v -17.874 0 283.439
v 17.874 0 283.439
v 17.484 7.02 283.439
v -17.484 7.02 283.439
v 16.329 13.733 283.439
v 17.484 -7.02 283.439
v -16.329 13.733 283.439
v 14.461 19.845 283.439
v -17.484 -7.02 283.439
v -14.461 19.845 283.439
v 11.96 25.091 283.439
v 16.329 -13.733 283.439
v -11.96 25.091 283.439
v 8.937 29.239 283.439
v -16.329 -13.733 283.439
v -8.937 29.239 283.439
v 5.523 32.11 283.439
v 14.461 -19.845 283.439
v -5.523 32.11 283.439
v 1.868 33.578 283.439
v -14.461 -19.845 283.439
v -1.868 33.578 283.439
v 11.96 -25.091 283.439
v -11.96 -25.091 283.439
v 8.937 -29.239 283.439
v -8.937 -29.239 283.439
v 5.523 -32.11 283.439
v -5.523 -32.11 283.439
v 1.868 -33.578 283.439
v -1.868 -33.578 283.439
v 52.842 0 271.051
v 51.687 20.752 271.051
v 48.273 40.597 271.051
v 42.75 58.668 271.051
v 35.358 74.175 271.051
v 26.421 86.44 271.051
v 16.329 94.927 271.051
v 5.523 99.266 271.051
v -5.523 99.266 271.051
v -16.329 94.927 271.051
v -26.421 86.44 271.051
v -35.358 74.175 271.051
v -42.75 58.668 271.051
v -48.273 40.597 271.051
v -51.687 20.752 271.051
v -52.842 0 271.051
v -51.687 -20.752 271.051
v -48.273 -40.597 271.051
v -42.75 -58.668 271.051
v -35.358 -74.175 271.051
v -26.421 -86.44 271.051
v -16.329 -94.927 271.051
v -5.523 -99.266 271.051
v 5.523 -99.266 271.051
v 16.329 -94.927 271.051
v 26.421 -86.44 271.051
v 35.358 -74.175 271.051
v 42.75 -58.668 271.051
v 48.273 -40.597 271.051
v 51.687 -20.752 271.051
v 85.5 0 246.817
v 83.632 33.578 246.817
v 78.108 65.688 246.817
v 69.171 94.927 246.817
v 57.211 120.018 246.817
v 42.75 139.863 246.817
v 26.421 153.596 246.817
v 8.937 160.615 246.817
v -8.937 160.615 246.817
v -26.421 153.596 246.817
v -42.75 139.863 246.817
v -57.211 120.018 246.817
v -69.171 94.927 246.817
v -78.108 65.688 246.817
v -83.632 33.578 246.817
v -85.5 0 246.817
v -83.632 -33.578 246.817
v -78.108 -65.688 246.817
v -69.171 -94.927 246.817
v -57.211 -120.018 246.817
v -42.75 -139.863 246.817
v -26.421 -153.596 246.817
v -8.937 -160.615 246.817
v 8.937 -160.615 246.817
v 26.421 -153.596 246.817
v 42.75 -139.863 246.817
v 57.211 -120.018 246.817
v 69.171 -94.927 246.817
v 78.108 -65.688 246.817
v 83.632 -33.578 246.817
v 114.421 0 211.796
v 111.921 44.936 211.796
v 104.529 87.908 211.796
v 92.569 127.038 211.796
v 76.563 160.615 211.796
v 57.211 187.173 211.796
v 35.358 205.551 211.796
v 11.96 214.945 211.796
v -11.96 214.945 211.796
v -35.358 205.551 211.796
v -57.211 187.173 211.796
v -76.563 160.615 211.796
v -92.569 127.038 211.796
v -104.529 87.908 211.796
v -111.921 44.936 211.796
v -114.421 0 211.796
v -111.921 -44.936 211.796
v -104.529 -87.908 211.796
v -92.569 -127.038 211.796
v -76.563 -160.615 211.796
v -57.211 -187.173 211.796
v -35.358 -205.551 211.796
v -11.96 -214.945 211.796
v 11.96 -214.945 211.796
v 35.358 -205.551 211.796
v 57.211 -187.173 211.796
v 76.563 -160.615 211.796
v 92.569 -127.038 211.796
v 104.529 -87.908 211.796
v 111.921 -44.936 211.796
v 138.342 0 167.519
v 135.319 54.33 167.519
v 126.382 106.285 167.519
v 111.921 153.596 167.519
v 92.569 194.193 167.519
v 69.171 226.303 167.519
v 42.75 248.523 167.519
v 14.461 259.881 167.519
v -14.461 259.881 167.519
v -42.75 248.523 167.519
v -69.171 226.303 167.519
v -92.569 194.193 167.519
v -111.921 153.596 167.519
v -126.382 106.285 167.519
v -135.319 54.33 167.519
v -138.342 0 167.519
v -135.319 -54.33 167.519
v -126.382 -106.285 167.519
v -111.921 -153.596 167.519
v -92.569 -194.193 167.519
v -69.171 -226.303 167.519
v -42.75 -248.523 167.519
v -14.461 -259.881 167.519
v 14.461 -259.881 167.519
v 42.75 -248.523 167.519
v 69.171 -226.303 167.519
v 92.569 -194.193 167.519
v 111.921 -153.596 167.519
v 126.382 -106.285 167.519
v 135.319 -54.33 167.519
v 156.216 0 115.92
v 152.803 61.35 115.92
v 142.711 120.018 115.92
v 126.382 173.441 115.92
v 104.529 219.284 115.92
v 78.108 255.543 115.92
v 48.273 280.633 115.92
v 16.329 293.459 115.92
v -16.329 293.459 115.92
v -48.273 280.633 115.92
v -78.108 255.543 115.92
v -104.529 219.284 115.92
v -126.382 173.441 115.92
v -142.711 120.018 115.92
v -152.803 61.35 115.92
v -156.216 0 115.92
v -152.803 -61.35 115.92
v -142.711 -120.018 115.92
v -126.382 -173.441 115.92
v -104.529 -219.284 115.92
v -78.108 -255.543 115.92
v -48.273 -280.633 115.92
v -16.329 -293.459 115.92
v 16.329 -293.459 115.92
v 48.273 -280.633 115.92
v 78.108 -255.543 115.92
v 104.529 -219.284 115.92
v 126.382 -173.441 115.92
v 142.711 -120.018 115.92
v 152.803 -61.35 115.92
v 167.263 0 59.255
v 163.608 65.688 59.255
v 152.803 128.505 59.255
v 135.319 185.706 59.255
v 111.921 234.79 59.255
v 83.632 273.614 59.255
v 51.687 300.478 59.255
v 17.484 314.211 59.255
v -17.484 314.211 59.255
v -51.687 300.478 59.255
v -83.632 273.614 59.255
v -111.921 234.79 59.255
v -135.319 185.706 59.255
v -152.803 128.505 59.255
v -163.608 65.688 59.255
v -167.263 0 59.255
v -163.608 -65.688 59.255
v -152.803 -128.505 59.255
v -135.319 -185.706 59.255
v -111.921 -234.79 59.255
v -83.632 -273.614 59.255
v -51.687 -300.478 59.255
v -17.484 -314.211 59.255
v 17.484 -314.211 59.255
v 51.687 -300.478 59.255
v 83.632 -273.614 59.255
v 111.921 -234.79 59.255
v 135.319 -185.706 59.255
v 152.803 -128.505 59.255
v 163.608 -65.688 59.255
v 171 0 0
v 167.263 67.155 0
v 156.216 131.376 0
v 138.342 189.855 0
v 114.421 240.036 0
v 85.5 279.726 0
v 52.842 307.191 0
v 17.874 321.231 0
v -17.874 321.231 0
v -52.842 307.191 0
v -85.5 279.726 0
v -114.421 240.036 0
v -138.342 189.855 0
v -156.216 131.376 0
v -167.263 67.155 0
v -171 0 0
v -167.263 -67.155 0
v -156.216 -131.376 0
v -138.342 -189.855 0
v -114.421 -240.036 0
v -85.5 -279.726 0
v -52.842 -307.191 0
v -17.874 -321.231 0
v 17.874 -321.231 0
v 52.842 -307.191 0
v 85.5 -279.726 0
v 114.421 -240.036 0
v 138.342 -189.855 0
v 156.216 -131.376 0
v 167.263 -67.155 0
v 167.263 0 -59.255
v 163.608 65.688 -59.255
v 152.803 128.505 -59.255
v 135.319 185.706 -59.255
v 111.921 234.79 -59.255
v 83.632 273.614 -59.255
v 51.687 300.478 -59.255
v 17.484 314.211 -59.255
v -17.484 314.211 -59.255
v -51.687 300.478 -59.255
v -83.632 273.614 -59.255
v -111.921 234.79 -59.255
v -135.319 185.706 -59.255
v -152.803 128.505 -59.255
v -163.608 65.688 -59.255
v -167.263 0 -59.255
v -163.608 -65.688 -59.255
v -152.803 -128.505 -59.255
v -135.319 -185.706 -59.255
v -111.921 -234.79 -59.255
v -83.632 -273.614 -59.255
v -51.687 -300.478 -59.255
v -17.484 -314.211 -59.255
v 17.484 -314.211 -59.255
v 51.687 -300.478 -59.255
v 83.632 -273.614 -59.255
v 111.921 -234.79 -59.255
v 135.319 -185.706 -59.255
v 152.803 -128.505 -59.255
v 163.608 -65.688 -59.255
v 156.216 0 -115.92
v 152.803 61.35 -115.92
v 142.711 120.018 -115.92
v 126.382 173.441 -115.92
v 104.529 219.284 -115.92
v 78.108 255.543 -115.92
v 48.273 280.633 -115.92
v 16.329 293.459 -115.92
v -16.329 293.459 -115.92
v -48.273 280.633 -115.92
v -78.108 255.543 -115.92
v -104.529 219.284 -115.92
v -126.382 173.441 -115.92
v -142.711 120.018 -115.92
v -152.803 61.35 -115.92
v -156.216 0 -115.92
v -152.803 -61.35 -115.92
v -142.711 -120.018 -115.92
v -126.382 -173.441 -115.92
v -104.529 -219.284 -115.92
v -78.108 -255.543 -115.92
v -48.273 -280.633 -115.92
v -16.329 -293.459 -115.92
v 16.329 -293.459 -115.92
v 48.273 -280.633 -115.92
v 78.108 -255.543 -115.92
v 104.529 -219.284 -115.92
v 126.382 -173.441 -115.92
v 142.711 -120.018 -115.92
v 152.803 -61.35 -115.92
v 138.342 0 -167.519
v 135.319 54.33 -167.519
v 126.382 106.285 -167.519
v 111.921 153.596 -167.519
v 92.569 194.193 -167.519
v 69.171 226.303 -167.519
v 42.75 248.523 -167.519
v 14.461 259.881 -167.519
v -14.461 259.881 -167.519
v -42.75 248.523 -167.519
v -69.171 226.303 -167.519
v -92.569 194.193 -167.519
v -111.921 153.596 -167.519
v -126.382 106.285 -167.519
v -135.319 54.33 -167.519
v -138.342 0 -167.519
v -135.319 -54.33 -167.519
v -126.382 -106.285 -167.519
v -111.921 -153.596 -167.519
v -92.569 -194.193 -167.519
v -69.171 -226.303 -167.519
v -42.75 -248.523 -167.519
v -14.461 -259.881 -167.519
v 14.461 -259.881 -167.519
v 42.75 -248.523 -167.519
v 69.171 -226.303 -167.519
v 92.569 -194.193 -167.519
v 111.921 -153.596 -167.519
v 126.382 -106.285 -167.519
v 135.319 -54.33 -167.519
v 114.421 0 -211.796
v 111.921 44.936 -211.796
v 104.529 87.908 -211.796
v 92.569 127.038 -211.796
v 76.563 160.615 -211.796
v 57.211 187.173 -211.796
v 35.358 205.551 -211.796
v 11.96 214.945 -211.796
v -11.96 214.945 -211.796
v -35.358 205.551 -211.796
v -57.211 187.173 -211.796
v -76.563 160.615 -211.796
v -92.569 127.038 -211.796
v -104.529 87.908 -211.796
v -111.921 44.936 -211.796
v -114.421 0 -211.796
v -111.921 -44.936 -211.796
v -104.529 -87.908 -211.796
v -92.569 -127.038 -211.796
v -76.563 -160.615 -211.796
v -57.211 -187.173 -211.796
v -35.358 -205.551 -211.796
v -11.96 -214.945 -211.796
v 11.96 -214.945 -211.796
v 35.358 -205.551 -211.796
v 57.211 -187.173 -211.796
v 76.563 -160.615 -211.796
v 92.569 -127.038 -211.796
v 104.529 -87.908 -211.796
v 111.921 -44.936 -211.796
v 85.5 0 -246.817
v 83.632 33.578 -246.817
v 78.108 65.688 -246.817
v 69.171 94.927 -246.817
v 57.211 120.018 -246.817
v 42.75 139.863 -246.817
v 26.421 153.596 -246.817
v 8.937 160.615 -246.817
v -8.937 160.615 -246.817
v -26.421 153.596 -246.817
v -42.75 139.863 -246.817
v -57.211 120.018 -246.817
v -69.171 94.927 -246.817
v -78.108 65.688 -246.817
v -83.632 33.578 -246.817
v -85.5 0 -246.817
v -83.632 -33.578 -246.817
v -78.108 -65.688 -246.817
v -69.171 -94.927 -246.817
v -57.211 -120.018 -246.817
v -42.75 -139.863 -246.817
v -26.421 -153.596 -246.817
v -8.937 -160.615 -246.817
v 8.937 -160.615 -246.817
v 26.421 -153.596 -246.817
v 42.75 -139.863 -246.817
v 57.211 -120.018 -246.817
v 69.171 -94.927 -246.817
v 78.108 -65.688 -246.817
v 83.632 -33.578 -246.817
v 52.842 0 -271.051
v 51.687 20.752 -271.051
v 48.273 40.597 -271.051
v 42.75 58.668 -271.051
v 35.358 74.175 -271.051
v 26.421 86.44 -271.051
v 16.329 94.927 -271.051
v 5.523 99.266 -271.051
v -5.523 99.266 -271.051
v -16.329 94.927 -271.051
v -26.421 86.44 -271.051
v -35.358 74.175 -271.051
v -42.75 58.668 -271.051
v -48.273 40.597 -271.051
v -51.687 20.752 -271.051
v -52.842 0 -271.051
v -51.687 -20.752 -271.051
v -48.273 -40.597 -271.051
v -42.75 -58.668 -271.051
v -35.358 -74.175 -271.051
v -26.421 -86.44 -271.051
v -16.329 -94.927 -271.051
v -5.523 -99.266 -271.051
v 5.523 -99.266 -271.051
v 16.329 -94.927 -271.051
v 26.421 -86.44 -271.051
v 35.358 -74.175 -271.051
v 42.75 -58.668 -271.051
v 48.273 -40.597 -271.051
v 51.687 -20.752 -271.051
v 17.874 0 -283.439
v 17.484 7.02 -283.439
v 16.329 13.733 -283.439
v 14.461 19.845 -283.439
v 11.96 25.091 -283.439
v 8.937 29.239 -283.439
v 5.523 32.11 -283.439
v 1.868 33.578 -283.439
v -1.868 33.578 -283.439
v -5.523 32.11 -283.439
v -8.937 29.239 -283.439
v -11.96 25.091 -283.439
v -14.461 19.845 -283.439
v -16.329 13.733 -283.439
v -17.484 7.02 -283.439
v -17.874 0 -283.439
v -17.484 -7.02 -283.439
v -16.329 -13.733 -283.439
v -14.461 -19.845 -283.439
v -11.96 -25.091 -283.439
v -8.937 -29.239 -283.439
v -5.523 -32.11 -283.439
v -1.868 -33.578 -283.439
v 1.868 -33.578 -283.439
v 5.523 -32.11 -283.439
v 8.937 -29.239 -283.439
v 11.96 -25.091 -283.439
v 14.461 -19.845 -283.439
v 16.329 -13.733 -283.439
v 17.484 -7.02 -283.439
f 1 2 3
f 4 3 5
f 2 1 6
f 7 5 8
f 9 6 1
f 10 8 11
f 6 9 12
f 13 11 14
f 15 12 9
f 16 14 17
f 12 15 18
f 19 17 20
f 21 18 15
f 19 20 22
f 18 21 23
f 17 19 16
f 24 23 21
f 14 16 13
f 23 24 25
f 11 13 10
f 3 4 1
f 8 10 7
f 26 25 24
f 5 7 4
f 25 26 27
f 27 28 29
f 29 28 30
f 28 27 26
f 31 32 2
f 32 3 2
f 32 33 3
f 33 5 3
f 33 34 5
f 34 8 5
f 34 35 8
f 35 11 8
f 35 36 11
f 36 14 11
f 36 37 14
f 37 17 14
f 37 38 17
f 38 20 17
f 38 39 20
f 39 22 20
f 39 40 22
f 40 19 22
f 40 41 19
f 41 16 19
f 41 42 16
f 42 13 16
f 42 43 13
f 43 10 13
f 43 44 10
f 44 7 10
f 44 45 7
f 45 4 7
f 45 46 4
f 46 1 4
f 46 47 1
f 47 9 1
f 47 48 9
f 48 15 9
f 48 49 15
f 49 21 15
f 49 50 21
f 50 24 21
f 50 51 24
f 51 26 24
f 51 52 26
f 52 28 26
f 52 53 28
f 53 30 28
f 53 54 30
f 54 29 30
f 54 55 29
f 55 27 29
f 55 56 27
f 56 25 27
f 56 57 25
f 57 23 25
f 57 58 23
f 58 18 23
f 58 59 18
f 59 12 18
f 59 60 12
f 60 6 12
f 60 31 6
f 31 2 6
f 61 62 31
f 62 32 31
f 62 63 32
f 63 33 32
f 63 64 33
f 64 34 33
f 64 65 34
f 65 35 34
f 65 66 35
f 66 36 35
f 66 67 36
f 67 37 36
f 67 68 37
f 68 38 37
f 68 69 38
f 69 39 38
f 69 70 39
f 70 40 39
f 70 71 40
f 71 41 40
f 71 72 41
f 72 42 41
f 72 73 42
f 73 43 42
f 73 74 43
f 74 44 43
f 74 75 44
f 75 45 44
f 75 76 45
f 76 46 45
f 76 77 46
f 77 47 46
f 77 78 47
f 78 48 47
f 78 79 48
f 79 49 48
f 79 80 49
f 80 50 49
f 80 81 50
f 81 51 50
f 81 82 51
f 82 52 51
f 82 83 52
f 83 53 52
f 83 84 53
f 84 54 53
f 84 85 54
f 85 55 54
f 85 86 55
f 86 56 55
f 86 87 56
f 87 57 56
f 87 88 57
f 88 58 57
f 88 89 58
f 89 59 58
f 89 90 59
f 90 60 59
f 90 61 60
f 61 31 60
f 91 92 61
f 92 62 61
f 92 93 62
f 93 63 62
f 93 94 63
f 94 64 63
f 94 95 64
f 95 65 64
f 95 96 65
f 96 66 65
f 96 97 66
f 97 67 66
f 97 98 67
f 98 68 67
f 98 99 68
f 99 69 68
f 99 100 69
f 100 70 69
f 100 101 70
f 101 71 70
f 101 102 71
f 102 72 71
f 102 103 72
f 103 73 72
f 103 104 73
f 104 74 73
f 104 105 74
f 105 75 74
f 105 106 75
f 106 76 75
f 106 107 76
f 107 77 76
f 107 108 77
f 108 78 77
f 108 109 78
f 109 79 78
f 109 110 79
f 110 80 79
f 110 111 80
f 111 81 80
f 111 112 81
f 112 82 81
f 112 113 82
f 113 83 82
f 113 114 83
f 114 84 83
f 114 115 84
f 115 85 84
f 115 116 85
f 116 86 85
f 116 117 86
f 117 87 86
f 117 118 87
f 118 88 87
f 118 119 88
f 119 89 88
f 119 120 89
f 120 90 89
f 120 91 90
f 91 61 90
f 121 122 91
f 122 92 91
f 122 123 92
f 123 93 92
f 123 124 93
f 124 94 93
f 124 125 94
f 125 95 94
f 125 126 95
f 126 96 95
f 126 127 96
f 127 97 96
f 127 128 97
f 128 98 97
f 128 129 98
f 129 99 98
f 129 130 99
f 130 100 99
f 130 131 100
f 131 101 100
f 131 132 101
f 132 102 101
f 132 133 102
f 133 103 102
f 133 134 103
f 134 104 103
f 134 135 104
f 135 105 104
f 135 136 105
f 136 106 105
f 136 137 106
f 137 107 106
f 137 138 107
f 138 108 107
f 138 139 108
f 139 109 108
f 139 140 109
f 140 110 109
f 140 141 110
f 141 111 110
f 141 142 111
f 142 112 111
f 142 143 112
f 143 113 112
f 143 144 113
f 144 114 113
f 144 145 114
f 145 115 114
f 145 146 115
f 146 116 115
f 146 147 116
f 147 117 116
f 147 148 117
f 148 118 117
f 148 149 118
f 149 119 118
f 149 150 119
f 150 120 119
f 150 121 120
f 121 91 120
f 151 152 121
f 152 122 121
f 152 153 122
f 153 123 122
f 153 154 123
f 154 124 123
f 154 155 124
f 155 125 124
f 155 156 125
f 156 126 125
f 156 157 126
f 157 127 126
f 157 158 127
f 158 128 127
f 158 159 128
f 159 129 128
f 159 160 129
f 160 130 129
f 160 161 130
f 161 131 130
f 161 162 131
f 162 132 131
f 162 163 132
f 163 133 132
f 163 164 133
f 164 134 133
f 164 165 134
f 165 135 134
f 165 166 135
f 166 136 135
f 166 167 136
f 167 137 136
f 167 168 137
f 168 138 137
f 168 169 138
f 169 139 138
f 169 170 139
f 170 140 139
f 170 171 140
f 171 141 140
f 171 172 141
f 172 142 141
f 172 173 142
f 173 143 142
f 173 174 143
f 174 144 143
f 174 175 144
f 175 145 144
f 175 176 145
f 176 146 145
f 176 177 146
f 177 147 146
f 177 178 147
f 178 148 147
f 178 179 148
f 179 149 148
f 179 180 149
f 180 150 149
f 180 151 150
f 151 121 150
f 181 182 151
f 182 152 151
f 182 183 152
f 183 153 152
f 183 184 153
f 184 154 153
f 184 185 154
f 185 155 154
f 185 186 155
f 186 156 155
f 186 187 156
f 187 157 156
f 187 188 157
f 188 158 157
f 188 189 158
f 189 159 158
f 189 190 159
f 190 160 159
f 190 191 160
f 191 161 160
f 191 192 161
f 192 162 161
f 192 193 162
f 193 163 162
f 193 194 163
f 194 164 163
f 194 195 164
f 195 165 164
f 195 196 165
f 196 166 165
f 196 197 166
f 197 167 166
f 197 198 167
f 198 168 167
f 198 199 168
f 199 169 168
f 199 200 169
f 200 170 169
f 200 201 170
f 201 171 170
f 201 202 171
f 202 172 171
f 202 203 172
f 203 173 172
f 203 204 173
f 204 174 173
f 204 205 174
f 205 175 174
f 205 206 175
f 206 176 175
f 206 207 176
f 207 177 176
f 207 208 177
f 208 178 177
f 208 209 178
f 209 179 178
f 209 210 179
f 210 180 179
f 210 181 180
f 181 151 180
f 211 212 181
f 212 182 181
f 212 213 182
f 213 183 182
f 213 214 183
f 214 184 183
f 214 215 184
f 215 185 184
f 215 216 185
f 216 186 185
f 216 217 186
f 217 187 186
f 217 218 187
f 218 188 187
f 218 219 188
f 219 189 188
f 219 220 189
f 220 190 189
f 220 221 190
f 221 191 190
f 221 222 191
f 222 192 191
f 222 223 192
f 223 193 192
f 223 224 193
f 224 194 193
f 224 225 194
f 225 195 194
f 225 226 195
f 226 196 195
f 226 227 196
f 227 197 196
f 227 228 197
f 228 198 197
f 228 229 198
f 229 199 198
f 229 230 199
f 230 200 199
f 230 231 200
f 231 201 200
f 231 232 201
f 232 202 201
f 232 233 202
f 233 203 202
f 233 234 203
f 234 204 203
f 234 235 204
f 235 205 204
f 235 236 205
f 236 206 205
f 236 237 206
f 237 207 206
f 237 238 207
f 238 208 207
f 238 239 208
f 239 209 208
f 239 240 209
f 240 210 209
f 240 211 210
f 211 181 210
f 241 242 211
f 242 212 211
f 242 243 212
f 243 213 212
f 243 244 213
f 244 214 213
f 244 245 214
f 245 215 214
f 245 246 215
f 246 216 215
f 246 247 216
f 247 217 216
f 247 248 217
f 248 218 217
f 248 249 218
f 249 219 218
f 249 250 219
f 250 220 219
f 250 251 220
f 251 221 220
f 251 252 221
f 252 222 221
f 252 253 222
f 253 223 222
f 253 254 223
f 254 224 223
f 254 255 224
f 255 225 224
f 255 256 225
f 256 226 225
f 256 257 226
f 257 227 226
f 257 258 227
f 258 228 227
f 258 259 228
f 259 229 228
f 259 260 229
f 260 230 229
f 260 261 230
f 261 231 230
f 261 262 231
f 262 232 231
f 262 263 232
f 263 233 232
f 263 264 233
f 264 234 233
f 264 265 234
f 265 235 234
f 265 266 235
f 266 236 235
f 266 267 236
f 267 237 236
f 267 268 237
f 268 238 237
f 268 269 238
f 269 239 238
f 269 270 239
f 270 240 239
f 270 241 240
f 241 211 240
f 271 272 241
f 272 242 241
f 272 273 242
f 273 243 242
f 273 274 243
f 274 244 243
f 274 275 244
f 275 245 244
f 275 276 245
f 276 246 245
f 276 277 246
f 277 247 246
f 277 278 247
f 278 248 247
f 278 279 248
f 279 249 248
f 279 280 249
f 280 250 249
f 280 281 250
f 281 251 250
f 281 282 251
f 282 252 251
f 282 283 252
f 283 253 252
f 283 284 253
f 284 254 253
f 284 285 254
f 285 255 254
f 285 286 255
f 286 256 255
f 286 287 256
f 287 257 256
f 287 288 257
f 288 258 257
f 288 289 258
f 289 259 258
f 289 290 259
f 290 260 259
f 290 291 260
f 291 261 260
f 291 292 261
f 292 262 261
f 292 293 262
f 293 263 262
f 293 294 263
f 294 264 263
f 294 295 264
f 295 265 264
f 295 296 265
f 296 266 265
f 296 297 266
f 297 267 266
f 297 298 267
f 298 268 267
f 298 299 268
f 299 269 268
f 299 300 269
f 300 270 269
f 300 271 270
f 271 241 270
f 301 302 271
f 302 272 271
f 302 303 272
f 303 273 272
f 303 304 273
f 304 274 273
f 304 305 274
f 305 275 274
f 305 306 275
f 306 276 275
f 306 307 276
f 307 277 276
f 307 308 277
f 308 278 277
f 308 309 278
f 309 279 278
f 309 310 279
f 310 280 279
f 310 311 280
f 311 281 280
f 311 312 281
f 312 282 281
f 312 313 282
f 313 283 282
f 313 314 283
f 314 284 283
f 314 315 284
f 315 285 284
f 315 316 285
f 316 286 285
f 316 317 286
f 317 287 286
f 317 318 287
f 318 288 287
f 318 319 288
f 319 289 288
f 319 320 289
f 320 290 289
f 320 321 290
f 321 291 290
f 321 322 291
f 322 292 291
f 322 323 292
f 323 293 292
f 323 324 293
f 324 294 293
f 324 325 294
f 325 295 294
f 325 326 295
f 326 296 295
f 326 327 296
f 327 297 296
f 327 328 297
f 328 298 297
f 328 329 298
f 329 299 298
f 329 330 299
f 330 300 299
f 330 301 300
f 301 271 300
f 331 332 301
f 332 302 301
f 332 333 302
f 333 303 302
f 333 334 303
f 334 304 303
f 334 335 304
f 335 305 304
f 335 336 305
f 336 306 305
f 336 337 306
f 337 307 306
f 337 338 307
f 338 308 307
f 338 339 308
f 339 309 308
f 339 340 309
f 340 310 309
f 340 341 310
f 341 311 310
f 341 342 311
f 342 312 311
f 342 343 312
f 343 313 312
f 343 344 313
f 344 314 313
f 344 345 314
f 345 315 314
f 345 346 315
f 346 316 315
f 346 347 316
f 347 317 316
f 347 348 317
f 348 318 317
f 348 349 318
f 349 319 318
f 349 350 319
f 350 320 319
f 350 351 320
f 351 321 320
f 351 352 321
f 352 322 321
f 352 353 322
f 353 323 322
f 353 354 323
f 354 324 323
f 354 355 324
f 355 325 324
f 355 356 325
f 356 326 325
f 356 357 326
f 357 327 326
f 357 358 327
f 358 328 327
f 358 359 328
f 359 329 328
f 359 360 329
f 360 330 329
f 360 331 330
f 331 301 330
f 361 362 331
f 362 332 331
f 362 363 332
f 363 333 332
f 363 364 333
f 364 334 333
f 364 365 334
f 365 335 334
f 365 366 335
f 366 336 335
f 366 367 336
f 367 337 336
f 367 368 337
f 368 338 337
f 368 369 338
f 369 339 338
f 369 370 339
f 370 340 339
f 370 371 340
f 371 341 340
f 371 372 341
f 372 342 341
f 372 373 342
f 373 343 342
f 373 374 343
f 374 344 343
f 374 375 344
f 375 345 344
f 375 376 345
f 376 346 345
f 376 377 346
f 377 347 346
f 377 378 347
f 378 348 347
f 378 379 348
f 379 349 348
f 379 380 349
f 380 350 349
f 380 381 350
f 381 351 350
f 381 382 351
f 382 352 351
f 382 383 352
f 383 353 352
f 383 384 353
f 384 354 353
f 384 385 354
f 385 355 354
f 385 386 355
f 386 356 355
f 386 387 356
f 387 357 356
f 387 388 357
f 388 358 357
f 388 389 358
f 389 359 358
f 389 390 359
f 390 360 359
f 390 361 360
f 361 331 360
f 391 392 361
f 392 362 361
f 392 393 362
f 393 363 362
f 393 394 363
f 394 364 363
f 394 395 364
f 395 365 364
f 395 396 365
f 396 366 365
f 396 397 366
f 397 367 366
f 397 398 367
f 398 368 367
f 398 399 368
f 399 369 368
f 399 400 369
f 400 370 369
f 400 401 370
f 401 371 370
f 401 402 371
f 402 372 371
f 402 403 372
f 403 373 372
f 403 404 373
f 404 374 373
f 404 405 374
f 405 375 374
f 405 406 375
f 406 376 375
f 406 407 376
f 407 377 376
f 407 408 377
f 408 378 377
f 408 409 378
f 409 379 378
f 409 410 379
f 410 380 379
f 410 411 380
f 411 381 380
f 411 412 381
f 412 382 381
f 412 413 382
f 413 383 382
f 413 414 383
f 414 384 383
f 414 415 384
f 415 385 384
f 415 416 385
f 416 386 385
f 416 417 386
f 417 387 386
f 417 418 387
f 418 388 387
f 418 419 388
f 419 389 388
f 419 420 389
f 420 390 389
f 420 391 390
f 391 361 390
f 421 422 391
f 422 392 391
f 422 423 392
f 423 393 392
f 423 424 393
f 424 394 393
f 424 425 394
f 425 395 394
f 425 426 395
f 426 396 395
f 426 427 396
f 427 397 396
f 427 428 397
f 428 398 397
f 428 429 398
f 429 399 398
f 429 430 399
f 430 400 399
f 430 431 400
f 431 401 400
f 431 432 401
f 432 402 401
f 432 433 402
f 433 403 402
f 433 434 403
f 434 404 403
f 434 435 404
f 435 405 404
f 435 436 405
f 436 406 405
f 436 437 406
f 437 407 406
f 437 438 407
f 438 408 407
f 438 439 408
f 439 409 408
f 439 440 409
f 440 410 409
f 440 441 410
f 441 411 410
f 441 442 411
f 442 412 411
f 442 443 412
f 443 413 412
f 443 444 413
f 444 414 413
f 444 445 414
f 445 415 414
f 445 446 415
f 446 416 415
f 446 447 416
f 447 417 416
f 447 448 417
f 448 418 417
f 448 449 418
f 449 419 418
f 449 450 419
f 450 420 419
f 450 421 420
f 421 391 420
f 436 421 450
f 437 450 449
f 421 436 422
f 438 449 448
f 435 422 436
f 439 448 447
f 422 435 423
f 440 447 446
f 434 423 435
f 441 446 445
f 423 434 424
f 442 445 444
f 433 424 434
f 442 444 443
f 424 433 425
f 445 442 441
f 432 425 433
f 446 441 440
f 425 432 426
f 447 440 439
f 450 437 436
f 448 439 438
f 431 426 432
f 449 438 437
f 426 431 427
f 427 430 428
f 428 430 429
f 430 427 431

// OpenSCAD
// Generated by SolidPython 1.0.1 on 2020-07-29 00:46:49


scale(v = [9, 17, 15]) {
	sphere(r = 19);
}
/***********************************************
*********      SolidPython code:      **********
************************************************
 
# import packages: SolidPython
from solid import *
from solid.utils import *
from itertools import chain, combinations, permutations


class Resize:

    def __init__(self, scad_file):
        self.scad_file = scad_file
        #self.scad_file = import_scad(scad_file)
        # cone/cylinder param:
        self.r1 = 0
        self.r2 = 0
        self.h = 0
        # rectangular prism param:
        self.w = 0
        self.l = 0
        # ellipse param:
        self.r = 0

    # import OpenScad code (file name corresponds to shape)


    # classify shape + parameters
    def assign(self, param1, param2, param3):
        if self.scad_file == 'cone.scad':
            self.r1 = param1
            self.r2 = param2
            self.h = param3
        elif self.scad_file == 'cylinder.scad':
            self.r1 = param1
            self.r2 = param2
            self.h = param3
        elif self.scad_file == 'rectangularPrism.scad':
            self.h = param1
            self.l = param2
            self.w = param3
        else:
            self.r = param1
            self.h = param2

    # resize parameters
    def iterate(self):
        x = range(3, 20, 2)
        i = 1
        if self.scad_file == 'cone.scad':
            tempList = list(permutations(x, 2))
            for temp in tempList:
                param1 = temp[0]
                param2 = temp[1]
                filepath = 'produced_scad_files/' + 'cone' + str(param1) + '_' + str(param2) + '_' + '.scad'
                scad_render_to_file(cylinder(h=param1, r1=param2, r2=0), filepath)

        elif self.scad_file == 'cylinder.scad':
            tempList = list(permutations(x, 3))
            for temp in tempList:
                param1 = temp[0]
                param2 = temp[1]
                filepath = 'produced_scad_files/' + 'cylinder' + str(param1) + '_' + str(param2) + '_' + '.scad'
                scad_render_to_file(cylinder(h=param1, r1=param2, r2=param2), filepath)

        elif self.scad_file == 'rectangularPrism.scad':
            tempList = list(permutations(x, 3))
            for temp in tempList:
                param1 = temp[0]
                param2 = temp[1]
                param3 = temp[2]
                filepath = 'produced_scad_files/' + 'rectangularPrism' + str(param1) + '_' + str(param2) + '_' + str(
                    param3) + '.scad'
                scad_render_to_file(cube(size=(param1, param2, param3)), filepath)

        elif self.scad_file == 'ellipse.scad':
            tempList = list(permutations(x, 4))
            for temp in tempList:
                param1 = temp[0]
                param2 = temp[1]
                param3 = temp[2]
                param4 = temp[3]
                filepath = 'produced_scad_files/' + 'ellipse' + str(param1) + '_' + str(param2) + '_' + str(param3) + '_' + str(param4) + '.scad'
                scad_render_to_file(scale([param1, param2, param3])(sphere(r=param4)), filepath)

    def render_to_scadfile(self):
        scad_render_to_file(scad, 'example.scad') 
 
************************************************/
